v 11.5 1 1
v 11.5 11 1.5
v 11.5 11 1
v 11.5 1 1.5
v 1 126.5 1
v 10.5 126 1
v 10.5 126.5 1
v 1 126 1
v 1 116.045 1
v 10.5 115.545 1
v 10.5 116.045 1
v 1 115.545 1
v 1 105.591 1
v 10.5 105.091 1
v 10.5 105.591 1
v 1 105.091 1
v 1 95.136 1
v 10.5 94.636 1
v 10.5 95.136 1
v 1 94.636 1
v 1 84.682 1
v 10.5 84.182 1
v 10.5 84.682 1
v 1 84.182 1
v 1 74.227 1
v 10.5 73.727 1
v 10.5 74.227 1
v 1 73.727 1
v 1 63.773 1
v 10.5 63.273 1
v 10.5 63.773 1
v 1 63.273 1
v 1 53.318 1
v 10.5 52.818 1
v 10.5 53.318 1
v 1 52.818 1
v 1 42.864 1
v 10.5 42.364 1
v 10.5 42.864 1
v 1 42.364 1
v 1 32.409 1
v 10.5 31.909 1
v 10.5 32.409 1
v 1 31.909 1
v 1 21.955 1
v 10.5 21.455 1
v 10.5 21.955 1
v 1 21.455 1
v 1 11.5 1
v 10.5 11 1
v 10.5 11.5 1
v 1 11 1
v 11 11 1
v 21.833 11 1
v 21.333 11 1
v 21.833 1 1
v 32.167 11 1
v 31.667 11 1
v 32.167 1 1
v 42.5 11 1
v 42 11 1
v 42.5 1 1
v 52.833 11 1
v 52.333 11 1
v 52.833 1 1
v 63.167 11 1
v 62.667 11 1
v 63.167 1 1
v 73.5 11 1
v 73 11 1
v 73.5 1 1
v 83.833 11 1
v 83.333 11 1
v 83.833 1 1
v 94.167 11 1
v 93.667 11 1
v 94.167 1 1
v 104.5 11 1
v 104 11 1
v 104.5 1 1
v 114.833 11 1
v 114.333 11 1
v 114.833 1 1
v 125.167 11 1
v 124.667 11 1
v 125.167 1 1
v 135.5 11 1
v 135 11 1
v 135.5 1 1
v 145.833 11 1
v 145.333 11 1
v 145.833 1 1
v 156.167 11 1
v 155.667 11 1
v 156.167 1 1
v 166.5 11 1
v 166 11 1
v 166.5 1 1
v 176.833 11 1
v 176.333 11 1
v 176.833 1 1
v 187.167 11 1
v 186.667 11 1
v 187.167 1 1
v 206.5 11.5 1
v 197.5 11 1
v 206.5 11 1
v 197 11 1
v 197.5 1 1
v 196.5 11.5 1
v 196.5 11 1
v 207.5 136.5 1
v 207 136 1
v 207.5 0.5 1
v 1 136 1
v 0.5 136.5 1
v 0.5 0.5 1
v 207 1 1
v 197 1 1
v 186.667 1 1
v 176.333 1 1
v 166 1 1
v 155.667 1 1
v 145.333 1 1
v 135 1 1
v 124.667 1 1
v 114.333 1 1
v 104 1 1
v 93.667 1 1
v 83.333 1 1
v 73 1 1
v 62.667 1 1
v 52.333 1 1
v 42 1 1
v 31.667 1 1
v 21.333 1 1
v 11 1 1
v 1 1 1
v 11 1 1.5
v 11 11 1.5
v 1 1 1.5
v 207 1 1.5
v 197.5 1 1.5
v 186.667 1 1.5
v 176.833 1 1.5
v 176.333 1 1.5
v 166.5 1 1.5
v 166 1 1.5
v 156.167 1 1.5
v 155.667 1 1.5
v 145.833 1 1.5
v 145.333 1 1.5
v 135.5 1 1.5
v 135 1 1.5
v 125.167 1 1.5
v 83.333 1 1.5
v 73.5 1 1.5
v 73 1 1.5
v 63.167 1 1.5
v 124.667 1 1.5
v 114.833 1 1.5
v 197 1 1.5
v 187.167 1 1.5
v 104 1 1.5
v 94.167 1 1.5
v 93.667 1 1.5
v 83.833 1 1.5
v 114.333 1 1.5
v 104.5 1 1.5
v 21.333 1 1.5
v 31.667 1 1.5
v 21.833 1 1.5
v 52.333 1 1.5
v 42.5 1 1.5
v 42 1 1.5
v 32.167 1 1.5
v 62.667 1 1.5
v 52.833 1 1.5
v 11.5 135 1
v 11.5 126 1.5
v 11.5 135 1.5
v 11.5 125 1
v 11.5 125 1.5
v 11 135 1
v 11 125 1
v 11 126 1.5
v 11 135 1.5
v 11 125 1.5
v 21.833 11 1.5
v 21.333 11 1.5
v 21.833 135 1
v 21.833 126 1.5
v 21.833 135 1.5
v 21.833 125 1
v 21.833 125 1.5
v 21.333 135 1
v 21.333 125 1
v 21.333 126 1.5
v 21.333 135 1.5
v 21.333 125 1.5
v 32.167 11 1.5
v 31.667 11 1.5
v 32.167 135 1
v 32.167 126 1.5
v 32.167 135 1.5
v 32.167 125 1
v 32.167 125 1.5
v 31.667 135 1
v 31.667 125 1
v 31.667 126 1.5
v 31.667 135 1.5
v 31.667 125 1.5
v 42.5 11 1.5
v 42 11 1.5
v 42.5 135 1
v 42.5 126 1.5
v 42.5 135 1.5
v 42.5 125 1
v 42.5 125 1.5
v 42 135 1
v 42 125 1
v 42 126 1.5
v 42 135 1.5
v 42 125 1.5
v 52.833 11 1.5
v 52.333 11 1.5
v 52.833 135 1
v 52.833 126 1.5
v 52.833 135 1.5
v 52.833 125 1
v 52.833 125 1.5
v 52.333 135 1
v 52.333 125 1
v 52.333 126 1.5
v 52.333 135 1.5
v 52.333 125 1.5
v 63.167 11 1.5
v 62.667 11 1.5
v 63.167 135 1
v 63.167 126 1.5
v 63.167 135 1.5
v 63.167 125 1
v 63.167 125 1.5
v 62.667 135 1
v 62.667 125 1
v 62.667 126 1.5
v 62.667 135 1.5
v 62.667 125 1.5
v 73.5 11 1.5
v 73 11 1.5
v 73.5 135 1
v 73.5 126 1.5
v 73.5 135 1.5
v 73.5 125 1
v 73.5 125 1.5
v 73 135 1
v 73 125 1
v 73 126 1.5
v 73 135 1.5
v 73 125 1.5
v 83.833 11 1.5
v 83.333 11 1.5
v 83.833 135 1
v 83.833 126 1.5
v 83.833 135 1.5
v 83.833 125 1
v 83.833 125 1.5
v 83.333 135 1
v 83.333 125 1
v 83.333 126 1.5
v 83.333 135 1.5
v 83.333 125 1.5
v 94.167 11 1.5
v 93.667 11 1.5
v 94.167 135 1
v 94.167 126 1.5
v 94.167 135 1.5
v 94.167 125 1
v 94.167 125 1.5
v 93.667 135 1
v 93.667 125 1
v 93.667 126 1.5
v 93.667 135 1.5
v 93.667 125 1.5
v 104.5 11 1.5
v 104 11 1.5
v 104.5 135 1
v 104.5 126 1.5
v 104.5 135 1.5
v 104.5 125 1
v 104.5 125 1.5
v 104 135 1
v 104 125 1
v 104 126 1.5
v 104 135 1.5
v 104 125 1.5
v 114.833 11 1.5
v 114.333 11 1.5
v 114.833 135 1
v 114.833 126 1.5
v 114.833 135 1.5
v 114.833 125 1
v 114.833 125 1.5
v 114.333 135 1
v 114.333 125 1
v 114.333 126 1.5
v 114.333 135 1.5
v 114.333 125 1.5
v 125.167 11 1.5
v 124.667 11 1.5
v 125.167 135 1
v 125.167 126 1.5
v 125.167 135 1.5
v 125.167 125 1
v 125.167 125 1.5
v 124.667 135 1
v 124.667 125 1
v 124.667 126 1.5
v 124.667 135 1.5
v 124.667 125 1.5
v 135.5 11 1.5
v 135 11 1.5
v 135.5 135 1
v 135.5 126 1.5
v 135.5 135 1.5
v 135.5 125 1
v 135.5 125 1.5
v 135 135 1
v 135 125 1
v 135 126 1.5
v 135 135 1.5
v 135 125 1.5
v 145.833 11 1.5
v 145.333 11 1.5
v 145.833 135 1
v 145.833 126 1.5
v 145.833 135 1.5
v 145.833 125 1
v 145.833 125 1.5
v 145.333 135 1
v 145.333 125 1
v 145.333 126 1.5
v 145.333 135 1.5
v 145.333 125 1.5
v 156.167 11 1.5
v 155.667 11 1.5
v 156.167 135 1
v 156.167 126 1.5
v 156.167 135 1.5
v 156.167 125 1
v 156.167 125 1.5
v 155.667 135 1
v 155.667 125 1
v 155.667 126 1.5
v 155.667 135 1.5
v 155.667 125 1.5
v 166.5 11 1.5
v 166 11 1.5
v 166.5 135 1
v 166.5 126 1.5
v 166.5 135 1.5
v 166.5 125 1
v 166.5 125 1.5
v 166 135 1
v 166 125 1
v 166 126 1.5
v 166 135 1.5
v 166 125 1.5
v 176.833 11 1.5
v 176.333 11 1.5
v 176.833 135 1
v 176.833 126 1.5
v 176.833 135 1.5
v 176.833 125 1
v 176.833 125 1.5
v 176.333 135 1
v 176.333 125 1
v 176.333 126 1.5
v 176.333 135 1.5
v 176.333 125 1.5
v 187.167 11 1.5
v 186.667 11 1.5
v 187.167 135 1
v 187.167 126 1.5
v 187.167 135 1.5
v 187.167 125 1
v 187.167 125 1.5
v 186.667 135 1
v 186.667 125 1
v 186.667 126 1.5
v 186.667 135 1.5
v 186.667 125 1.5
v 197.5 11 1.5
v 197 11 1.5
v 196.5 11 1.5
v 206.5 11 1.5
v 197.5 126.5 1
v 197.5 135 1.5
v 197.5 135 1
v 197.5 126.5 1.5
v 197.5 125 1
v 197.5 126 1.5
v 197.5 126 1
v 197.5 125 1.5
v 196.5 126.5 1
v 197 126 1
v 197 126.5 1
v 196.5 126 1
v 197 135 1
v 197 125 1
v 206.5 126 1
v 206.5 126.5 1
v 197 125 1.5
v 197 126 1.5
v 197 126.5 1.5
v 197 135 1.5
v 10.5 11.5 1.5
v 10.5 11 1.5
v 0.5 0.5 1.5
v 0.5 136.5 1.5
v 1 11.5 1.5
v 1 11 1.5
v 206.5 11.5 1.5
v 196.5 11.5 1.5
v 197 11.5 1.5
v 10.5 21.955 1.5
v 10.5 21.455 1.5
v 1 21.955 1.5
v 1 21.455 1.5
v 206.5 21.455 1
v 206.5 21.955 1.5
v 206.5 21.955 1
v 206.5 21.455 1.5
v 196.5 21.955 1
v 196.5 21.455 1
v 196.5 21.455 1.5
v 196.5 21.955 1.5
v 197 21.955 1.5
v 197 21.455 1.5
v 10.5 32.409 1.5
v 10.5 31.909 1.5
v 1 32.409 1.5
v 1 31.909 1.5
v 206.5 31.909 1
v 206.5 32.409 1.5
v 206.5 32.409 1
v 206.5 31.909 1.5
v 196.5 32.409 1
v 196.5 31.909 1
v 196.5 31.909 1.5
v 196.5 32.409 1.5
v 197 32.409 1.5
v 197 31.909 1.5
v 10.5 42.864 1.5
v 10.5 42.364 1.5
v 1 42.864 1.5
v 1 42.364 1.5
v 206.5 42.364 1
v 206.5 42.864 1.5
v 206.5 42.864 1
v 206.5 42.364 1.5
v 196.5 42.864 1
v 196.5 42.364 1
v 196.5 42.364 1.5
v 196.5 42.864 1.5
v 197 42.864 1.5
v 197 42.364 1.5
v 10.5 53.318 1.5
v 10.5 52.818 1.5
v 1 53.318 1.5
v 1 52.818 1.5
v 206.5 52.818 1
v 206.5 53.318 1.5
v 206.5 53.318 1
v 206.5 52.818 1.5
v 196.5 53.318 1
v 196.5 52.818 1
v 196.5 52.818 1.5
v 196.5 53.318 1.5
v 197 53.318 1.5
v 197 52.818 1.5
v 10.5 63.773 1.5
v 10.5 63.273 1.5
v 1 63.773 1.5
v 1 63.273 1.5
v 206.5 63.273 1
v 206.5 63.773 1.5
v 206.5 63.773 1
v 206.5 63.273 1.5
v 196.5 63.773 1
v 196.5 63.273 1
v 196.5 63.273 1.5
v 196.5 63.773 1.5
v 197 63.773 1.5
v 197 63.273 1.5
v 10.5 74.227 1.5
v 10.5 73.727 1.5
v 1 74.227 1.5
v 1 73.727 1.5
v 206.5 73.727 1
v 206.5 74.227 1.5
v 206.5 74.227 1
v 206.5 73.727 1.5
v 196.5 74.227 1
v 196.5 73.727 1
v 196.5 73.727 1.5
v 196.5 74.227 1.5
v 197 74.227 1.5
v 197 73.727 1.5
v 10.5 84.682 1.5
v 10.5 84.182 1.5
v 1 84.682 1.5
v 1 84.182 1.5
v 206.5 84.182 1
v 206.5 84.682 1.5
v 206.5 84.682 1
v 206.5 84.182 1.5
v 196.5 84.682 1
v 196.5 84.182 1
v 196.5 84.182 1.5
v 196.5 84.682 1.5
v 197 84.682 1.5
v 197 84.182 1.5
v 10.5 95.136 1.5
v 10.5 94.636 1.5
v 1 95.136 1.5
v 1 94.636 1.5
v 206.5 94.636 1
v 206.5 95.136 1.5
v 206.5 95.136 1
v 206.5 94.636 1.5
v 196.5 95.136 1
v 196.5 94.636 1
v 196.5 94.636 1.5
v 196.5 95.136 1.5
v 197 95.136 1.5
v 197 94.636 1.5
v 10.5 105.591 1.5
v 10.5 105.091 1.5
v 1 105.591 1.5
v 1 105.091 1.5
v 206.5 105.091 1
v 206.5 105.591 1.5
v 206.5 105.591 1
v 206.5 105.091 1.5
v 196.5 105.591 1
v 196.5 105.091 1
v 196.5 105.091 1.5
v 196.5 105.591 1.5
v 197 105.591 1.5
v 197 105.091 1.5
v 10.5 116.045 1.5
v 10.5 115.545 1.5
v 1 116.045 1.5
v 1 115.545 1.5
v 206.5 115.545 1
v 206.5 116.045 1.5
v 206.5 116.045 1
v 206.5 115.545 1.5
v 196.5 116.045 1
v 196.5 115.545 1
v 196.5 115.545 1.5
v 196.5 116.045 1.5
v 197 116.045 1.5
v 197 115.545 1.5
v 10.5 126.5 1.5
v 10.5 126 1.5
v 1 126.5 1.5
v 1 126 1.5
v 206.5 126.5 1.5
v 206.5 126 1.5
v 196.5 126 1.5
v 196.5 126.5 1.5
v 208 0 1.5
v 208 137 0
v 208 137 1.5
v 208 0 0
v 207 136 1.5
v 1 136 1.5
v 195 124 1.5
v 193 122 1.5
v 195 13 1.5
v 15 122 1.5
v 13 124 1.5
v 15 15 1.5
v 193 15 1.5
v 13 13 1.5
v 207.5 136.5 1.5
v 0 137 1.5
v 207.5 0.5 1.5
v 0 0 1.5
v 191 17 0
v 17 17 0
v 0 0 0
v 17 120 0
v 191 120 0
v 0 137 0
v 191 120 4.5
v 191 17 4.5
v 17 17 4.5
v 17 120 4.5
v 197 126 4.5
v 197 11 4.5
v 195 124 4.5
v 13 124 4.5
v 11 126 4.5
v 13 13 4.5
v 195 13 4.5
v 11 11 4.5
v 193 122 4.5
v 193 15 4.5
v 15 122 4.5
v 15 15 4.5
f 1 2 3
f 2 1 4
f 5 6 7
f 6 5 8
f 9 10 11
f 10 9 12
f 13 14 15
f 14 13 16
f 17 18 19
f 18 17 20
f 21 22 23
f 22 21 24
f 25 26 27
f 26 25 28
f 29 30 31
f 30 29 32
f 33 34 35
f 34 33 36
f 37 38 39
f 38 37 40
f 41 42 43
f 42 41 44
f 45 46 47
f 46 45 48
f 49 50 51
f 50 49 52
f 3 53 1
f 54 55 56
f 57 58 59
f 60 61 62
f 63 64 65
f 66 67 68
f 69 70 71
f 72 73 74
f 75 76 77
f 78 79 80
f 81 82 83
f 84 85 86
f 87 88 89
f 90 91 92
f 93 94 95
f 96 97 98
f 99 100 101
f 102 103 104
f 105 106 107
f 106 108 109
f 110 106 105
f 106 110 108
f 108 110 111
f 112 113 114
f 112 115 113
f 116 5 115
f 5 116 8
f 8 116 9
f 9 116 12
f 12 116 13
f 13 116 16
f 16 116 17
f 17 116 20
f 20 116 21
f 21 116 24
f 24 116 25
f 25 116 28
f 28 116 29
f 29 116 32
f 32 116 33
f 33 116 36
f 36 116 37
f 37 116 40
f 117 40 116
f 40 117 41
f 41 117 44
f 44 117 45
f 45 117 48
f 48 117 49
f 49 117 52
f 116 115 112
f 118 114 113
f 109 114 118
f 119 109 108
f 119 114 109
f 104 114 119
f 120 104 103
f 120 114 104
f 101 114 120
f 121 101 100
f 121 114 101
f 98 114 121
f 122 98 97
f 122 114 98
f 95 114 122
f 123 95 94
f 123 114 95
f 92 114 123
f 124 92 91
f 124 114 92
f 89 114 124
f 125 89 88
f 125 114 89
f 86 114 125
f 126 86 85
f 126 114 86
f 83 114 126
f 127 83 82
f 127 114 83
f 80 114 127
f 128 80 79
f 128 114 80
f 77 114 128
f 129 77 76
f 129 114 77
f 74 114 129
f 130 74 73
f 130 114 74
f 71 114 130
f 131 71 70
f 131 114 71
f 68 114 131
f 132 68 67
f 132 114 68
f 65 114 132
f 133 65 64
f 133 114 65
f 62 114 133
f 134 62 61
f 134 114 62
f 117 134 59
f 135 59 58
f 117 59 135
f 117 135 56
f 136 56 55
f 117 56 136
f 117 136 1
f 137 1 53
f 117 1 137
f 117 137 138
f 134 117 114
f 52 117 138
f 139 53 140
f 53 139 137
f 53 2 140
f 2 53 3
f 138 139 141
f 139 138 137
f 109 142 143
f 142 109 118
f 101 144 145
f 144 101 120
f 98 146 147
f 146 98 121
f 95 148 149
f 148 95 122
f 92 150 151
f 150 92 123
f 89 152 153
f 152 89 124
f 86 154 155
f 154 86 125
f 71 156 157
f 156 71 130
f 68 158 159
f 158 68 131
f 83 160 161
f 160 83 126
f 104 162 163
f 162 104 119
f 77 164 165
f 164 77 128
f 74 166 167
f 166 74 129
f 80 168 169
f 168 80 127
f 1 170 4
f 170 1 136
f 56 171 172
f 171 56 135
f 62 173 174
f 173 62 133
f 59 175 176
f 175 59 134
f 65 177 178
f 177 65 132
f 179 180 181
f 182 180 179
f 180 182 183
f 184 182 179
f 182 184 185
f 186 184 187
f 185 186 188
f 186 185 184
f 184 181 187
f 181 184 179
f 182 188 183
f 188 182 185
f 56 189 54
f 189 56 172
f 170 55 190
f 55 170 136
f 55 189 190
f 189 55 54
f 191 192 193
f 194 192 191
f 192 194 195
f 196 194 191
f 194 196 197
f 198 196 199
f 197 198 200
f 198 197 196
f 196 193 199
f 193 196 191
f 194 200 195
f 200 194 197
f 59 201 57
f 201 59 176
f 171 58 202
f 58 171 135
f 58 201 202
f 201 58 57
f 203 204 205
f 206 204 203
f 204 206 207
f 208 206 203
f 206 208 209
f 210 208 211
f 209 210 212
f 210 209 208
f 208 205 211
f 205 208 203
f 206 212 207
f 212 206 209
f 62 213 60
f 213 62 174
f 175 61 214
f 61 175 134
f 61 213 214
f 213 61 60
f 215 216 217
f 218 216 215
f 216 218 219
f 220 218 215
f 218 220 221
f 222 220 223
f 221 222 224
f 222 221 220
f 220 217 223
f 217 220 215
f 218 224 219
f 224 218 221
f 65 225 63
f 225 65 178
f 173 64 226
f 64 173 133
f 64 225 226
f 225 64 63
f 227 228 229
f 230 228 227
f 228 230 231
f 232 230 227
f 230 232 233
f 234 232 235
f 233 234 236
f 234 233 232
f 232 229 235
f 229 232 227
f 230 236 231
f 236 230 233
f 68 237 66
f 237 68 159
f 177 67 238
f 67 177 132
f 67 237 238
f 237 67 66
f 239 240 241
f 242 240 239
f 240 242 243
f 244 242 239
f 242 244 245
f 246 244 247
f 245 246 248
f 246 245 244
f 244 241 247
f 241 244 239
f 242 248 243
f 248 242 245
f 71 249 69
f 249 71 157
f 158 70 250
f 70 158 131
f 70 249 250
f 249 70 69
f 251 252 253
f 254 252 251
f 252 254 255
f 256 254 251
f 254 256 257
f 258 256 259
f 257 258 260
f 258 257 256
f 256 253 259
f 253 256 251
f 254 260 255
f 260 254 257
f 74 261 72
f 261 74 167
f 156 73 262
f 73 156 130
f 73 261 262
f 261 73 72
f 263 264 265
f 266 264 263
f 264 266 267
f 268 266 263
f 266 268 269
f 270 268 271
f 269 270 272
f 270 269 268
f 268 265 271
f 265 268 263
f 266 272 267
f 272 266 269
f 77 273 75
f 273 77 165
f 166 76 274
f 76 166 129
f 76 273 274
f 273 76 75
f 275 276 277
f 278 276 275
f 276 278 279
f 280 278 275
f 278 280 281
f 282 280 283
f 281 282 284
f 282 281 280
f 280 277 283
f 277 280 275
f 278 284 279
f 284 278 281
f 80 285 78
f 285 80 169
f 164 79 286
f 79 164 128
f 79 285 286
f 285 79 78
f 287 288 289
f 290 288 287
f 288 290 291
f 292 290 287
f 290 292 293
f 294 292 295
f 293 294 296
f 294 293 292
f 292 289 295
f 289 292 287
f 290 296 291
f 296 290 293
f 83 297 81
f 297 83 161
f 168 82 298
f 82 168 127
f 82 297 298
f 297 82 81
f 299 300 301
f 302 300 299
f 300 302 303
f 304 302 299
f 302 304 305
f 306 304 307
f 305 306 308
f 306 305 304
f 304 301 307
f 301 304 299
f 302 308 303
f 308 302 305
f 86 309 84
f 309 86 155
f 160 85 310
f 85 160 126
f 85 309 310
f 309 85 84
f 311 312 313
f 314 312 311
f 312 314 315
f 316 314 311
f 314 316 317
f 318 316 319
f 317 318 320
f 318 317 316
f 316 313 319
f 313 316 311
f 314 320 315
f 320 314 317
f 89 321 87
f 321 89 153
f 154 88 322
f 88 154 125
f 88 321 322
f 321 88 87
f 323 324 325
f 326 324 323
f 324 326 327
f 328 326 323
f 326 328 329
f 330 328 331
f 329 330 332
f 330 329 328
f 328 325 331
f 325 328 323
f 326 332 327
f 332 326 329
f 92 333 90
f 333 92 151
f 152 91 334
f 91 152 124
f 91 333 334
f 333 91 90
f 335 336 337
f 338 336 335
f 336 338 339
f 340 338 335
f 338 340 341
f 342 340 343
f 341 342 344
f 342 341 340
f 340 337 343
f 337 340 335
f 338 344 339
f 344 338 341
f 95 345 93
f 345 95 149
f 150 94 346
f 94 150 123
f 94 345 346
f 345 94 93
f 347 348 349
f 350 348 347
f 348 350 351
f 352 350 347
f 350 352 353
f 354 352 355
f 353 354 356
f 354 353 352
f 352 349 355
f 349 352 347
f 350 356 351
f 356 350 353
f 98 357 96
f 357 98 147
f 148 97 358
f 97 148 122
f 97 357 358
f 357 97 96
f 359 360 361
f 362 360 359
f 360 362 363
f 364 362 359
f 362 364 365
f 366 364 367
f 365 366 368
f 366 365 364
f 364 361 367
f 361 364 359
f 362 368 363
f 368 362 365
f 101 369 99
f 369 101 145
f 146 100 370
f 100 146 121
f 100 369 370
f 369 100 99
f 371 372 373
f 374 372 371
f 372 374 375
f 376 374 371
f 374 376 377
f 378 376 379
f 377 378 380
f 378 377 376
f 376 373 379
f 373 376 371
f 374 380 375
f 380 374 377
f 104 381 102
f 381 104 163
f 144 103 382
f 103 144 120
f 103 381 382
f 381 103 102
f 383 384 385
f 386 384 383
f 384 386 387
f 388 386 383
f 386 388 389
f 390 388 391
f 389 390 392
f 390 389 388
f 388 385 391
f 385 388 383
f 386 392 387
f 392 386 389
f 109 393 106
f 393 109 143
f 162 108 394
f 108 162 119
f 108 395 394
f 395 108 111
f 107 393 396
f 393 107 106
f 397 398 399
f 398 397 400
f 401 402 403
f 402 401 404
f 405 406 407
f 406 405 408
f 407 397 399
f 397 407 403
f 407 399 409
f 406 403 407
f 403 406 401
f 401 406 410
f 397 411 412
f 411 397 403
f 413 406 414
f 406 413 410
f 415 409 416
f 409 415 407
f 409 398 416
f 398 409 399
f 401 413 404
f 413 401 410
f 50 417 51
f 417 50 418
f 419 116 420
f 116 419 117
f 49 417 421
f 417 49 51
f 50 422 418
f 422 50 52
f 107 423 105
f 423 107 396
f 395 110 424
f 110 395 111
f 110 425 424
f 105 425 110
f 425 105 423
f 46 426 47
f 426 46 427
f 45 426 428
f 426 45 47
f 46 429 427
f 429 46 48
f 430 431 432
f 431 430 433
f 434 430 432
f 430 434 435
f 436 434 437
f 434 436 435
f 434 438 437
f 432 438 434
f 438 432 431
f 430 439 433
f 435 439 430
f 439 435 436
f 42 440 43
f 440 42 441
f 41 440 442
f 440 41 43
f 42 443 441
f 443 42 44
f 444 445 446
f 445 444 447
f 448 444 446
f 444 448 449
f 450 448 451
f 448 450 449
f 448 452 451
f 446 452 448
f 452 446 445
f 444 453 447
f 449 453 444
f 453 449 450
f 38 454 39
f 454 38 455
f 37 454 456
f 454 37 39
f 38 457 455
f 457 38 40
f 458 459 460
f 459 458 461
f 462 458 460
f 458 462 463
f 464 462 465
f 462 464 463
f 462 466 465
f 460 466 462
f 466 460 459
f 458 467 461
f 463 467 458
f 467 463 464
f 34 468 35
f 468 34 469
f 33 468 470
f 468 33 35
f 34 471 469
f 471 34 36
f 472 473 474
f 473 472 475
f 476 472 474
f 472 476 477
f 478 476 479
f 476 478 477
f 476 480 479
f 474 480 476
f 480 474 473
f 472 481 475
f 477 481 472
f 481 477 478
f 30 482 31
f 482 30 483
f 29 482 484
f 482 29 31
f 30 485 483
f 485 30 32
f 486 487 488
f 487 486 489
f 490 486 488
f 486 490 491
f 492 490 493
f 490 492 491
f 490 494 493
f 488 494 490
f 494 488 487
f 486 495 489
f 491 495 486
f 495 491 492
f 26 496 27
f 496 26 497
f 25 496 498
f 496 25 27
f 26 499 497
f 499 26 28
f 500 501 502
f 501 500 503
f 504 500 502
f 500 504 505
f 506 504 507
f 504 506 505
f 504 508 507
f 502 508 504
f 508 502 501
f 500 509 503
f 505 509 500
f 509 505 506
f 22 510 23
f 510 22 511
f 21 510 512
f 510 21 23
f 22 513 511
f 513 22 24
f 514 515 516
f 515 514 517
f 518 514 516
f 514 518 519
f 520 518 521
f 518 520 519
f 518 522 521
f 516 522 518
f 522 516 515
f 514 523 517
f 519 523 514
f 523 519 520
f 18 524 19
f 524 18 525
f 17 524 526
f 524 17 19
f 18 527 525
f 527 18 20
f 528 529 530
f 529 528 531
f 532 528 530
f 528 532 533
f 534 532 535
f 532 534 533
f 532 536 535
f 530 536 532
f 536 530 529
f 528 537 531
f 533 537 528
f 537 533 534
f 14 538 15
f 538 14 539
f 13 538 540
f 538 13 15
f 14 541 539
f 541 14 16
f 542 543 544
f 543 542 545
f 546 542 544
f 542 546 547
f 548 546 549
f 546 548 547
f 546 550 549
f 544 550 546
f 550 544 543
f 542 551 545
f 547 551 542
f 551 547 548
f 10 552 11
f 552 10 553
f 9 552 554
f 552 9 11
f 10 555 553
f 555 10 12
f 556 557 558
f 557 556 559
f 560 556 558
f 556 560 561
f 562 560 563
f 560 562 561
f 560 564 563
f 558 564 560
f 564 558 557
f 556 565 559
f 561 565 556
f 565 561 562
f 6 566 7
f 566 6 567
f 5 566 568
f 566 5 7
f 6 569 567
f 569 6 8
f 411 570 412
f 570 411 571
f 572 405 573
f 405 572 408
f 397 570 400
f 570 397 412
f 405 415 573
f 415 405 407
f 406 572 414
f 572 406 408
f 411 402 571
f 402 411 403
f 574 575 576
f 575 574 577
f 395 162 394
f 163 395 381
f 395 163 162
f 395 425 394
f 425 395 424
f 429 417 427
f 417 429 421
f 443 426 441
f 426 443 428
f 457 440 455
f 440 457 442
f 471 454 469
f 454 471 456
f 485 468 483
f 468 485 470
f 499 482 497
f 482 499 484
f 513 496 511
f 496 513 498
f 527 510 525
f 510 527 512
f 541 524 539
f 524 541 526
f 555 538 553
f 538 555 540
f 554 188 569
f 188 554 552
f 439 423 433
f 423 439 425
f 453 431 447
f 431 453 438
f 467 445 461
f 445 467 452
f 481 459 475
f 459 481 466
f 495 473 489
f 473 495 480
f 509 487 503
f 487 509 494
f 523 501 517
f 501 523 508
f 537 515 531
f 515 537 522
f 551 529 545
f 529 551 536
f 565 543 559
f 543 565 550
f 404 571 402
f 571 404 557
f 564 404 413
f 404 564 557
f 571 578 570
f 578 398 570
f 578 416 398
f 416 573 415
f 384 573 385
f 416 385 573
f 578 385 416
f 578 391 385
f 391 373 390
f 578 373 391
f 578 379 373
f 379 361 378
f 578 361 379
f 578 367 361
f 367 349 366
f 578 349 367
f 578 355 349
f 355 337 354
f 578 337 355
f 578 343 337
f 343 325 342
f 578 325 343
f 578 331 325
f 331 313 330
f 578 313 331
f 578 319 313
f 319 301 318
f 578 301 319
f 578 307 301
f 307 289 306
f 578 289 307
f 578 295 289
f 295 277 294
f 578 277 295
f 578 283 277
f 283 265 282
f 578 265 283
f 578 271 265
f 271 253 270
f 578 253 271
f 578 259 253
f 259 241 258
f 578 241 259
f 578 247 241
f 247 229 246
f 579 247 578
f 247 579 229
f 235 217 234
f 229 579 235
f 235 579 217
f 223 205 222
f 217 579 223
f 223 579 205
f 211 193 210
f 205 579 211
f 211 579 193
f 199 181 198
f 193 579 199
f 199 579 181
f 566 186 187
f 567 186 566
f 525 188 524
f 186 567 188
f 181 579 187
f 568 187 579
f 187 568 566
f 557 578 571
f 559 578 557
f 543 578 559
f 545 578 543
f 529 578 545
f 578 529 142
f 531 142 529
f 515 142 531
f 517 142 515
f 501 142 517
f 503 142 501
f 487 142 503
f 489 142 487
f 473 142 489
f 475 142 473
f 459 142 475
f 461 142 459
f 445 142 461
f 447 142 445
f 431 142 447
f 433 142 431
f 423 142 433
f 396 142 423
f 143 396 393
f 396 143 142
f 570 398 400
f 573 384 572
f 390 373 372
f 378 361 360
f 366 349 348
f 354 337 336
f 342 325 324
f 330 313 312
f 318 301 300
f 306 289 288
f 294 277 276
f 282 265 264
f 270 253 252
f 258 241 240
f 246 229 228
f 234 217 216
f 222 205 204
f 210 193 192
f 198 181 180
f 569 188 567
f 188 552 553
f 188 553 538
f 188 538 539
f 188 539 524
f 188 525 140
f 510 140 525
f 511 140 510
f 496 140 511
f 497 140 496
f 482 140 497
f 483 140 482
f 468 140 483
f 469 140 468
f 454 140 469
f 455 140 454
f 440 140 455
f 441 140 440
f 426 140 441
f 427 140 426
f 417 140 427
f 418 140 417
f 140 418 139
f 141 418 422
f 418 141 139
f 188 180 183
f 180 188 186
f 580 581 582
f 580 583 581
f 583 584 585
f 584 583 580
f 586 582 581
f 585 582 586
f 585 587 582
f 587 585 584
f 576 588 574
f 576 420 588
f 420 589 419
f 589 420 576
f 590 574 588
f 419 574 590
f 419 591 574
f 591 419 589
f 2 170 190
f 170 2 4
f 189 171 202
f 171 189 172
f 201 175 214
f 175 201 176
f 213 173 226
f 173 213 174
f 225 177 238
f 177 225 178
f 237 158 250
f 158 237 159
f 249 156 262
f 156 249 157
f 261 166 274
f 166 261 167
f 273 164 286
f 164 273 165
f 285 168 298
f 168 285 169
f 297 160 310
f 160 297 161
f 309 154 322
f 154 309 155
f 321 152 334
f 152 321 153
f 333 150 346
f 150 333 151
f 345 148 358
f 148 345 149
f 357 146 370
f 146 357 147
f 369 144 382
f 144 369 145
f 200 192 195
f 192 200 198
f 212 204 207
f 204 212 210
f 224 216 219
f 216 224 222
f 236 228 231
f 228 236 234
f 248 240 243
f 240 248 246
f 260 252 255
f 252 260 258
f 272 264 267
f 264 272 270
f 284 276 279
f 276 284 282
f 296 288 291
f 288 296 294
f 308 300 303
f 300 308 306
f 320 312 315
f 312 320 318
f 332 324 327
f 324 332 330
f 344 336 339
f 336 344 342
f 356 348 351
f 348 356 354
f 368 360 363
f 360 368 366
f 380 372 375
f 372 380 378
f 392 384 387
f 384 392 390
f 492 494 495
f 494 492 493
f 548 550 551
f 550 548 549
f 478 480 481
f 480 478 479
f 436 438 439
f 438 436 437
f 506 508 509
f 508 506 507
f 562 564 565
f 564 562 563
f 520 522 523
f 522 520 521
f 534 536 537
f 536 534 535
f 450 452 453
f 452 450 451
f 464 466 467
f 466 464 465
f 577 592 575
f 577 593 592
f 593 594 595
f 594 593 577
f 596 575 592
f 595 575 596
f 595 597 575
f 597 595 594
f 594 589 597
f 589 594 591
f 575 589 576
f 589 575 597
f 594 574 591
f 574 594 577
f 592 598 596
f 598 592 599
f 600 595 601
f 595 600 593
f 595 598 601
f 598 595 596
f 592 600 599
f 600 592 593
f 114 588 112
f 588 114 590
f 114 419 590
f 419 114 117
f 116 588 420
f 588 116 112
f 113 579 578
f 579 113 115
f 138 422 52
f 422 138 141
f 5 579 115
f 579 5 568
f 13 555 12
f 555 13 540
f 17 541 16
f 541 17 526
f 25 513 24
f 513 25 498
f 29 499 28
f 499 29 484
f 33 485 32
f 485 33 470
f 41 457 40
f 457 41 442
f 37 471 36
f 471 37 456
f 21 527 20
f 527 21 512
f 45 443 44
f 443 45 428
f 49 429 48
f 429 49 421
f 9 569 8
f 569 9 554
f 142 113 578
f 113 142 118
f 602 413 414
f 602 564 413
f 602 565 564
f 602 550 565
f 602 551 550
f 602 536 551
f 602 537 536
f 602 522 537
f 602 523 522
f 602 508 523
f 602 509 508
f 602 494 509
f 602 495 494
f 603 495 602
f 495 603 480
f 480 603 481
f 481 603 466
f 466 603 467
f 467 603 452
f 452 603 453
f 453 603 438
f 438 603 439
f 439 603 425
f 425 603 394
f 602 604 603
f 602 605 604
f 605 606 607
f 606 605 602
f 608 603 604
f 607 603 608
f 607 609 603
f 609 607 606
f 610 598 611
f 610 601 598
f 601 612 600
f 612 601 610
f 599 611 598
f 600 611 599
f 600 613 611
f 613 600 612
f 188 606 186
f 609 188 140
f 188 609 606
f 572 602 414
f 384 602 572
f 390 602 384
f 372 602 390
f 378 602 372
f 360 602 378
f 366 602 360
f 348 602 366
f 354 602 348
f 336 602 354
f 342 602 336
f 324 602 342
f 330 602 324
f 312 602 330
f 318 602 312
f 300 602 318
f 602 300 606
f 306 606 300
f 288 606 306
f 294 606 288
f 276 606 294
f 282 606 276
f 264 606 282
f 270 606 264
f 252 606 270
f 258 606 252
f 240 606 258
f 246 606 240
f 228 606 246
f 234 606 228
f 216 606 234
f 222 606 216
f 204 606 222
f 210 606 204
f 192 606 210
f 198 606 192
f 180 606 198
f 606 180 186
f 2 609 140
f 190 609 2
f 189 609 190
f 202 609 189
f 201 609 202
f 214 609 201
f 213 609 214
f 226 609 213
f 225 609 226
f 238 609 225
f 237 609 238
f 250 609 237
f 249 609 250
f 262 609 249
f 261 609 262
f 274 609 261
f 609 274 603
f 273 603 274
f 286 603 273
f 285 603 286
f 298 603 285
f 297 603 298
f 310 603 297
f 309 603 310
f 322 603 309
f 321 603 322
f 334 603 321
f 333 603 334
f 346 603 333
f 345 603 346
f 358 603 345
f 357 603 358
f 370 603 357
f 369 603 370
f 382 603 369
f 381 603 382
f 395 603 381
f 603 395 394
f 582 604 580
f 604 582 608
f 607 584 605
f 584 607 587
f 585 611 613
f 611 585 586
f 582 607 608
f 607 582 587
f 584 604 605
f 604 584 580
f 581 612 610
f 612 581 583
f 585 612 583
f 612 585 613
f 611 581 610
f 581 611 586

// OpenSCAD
//CUSTOMIZER VARIABLES
// Building sizes are 71mmx109mm, 109mmx109mm or 109mmx180mm
// The width of the building.
width=109; //[71:71 mm / 2 3/4", 109:109mm / 4 1/4", 180:180mm / 7"]
// The length of the building.
length=180; //[71:71 mm / 2 3/4", 109:109mm / 4 1/4", 180:180mm / 7"]
// How high above the sidewalk to make the slot for the building to fit in, in mm. 3 is recommended.
slot_height=3; //[1:5]
// How thick is the material of the building in mm. Note that the building is double-thik in places. 2 mm recommended.
paper=2;
// How much should the sidewalk stick out from the building, in mm. 5 is standard.
sidewalk_width=5;
// How high is the sidewalk, in mm. 1.5 is standard.
sidewalkHeight=1.5;
// How deep to make the grooves for the sidewalk texture. Should be less than sidewalk height. 0.5 is standard.
groove_depth=0.5;
// Number of sidewalk squares along the length. 18 is standard for 7". 10 is standard for 4". The number is scaled for the width.
sidewalk_squares= length==180 ? 18 : length==109 ? 10 : 7;
//CUSTOMIZER VARIABLES END

// number of sidewalk squares along the width
sidewalk_squares_width = round(sidewalk_squares*width/length);

// How wide is the sidewalk - include room for the slot.
base_width=sidewalk_width+3*paper;

// Outer perimeter of the whole thing.
outer_width=width+3*paper+2*base_width;
outer_length=length+3*paper+2*base_width;

// Outer perimeter of the building slot
outerSlotWidth=width+3*paper;
outerSlotLength=length+3*paper;

// Outer perimeter of the bit to remove in the middle.
innerWidth=width-3*paper;
innerLength=length-3*paper;

module sidewalk() {
    //Sidewalk
    difference() {
        // base
        cube([outer_length, outer_width, sidewalkHeight]);
        //remove from base
        translate([base_width+3*paper, base_width+3*paper,-1]) cube([innerLength,innerWidth,slot_height+2]);
        
        // x-axis groove nearest street
        translate([groove_depth,groove_depth,sidewalkHeight-groove_depth]) {
            cube([outer_length-1, 0.5, groove_depth+1]);
        }
        translate([groove_depth,outer_width-1,sidewalkHeight-groove_depth]) {
            cube([outer_length-1, 0.5, groove_depth+1]);
        }
        // y-axis groove
        translate([groove_depth,groove_depth,sidewalkHeight-groove_depth]) { 
            cube([0.5, outer_width-1, groove_depth+1]);
        }
        translate([outer_length-1,groove_depth,sidewalkHeight-groove_depth]) { 
            cube([0.5, outer_width-1, groove_depth+1]);
        }
    
        // sidewalk squares Length
        for(x=[0:1:sidewalk_squares]) {
            translate([base_width+x*outerSlotLength/sidewalk_squares, groove_depth+0.5, sidewalkHeight-groove_depth]) 
                cube([groove_depth,base_width-groove_depth-0.5,groove_depth+1]);
            translate([base_width+x*outerSlotLength/sidewalk_squares, outer_width-base_width-groove_depth-0.5, sidewalkHeight-groove_depth]) 
                cube([groove_depth,base_width-groove_depth-0.5,groove_depth+1]);
        }
        // sidewalk squares Width
        for(x=[0:1:sidewalk_squares_width]) {
            translate([groove_depth, base_width+x*outerSlotWidth/sidewalk_squares_width, sidewalkHeight-groove_depth]) 
                cube([base_width-groove_depth-0.5,groove_depth,groove_depth+2]);
            translate([outer_length-base_width-groove_depth, base_width+x*outerSlotWidth/sidewalk_squares_width, sidewalkHeight-groove_depth]) 
                cube([base_width-groove_depth-0.5,groove_depth,groove_depth+2]);
        }
    }
}
module buildingSlot() {
    translate([base_width, base_width, sidewalkHeight]) {
        difference() {
            // outer building Slot
            cube([outerSlotLength, outerSlotWidth,slot_height]);
            // inner building Slot
            translate([3*paper,3*paper,-1]) cube([innerLength,innerWidth,slot_height+2]);
            // Lengthwise building slot
            translate([paper,paper,0]) cube([length+paper,paper,slot_height+1]);
            translate([paper,width+paper,0]) cube([length+paper,paper,slot_height+1]);
            // width-wise building slot
            translate([paper,paper,0]) cube([paper, width+paper,slot_height+1]);
            translate([length+paper,paper,0]) cube([paper, width+paper,slot_height+1]);
        }
    }
}

sidewalk();
buildingSlot();
